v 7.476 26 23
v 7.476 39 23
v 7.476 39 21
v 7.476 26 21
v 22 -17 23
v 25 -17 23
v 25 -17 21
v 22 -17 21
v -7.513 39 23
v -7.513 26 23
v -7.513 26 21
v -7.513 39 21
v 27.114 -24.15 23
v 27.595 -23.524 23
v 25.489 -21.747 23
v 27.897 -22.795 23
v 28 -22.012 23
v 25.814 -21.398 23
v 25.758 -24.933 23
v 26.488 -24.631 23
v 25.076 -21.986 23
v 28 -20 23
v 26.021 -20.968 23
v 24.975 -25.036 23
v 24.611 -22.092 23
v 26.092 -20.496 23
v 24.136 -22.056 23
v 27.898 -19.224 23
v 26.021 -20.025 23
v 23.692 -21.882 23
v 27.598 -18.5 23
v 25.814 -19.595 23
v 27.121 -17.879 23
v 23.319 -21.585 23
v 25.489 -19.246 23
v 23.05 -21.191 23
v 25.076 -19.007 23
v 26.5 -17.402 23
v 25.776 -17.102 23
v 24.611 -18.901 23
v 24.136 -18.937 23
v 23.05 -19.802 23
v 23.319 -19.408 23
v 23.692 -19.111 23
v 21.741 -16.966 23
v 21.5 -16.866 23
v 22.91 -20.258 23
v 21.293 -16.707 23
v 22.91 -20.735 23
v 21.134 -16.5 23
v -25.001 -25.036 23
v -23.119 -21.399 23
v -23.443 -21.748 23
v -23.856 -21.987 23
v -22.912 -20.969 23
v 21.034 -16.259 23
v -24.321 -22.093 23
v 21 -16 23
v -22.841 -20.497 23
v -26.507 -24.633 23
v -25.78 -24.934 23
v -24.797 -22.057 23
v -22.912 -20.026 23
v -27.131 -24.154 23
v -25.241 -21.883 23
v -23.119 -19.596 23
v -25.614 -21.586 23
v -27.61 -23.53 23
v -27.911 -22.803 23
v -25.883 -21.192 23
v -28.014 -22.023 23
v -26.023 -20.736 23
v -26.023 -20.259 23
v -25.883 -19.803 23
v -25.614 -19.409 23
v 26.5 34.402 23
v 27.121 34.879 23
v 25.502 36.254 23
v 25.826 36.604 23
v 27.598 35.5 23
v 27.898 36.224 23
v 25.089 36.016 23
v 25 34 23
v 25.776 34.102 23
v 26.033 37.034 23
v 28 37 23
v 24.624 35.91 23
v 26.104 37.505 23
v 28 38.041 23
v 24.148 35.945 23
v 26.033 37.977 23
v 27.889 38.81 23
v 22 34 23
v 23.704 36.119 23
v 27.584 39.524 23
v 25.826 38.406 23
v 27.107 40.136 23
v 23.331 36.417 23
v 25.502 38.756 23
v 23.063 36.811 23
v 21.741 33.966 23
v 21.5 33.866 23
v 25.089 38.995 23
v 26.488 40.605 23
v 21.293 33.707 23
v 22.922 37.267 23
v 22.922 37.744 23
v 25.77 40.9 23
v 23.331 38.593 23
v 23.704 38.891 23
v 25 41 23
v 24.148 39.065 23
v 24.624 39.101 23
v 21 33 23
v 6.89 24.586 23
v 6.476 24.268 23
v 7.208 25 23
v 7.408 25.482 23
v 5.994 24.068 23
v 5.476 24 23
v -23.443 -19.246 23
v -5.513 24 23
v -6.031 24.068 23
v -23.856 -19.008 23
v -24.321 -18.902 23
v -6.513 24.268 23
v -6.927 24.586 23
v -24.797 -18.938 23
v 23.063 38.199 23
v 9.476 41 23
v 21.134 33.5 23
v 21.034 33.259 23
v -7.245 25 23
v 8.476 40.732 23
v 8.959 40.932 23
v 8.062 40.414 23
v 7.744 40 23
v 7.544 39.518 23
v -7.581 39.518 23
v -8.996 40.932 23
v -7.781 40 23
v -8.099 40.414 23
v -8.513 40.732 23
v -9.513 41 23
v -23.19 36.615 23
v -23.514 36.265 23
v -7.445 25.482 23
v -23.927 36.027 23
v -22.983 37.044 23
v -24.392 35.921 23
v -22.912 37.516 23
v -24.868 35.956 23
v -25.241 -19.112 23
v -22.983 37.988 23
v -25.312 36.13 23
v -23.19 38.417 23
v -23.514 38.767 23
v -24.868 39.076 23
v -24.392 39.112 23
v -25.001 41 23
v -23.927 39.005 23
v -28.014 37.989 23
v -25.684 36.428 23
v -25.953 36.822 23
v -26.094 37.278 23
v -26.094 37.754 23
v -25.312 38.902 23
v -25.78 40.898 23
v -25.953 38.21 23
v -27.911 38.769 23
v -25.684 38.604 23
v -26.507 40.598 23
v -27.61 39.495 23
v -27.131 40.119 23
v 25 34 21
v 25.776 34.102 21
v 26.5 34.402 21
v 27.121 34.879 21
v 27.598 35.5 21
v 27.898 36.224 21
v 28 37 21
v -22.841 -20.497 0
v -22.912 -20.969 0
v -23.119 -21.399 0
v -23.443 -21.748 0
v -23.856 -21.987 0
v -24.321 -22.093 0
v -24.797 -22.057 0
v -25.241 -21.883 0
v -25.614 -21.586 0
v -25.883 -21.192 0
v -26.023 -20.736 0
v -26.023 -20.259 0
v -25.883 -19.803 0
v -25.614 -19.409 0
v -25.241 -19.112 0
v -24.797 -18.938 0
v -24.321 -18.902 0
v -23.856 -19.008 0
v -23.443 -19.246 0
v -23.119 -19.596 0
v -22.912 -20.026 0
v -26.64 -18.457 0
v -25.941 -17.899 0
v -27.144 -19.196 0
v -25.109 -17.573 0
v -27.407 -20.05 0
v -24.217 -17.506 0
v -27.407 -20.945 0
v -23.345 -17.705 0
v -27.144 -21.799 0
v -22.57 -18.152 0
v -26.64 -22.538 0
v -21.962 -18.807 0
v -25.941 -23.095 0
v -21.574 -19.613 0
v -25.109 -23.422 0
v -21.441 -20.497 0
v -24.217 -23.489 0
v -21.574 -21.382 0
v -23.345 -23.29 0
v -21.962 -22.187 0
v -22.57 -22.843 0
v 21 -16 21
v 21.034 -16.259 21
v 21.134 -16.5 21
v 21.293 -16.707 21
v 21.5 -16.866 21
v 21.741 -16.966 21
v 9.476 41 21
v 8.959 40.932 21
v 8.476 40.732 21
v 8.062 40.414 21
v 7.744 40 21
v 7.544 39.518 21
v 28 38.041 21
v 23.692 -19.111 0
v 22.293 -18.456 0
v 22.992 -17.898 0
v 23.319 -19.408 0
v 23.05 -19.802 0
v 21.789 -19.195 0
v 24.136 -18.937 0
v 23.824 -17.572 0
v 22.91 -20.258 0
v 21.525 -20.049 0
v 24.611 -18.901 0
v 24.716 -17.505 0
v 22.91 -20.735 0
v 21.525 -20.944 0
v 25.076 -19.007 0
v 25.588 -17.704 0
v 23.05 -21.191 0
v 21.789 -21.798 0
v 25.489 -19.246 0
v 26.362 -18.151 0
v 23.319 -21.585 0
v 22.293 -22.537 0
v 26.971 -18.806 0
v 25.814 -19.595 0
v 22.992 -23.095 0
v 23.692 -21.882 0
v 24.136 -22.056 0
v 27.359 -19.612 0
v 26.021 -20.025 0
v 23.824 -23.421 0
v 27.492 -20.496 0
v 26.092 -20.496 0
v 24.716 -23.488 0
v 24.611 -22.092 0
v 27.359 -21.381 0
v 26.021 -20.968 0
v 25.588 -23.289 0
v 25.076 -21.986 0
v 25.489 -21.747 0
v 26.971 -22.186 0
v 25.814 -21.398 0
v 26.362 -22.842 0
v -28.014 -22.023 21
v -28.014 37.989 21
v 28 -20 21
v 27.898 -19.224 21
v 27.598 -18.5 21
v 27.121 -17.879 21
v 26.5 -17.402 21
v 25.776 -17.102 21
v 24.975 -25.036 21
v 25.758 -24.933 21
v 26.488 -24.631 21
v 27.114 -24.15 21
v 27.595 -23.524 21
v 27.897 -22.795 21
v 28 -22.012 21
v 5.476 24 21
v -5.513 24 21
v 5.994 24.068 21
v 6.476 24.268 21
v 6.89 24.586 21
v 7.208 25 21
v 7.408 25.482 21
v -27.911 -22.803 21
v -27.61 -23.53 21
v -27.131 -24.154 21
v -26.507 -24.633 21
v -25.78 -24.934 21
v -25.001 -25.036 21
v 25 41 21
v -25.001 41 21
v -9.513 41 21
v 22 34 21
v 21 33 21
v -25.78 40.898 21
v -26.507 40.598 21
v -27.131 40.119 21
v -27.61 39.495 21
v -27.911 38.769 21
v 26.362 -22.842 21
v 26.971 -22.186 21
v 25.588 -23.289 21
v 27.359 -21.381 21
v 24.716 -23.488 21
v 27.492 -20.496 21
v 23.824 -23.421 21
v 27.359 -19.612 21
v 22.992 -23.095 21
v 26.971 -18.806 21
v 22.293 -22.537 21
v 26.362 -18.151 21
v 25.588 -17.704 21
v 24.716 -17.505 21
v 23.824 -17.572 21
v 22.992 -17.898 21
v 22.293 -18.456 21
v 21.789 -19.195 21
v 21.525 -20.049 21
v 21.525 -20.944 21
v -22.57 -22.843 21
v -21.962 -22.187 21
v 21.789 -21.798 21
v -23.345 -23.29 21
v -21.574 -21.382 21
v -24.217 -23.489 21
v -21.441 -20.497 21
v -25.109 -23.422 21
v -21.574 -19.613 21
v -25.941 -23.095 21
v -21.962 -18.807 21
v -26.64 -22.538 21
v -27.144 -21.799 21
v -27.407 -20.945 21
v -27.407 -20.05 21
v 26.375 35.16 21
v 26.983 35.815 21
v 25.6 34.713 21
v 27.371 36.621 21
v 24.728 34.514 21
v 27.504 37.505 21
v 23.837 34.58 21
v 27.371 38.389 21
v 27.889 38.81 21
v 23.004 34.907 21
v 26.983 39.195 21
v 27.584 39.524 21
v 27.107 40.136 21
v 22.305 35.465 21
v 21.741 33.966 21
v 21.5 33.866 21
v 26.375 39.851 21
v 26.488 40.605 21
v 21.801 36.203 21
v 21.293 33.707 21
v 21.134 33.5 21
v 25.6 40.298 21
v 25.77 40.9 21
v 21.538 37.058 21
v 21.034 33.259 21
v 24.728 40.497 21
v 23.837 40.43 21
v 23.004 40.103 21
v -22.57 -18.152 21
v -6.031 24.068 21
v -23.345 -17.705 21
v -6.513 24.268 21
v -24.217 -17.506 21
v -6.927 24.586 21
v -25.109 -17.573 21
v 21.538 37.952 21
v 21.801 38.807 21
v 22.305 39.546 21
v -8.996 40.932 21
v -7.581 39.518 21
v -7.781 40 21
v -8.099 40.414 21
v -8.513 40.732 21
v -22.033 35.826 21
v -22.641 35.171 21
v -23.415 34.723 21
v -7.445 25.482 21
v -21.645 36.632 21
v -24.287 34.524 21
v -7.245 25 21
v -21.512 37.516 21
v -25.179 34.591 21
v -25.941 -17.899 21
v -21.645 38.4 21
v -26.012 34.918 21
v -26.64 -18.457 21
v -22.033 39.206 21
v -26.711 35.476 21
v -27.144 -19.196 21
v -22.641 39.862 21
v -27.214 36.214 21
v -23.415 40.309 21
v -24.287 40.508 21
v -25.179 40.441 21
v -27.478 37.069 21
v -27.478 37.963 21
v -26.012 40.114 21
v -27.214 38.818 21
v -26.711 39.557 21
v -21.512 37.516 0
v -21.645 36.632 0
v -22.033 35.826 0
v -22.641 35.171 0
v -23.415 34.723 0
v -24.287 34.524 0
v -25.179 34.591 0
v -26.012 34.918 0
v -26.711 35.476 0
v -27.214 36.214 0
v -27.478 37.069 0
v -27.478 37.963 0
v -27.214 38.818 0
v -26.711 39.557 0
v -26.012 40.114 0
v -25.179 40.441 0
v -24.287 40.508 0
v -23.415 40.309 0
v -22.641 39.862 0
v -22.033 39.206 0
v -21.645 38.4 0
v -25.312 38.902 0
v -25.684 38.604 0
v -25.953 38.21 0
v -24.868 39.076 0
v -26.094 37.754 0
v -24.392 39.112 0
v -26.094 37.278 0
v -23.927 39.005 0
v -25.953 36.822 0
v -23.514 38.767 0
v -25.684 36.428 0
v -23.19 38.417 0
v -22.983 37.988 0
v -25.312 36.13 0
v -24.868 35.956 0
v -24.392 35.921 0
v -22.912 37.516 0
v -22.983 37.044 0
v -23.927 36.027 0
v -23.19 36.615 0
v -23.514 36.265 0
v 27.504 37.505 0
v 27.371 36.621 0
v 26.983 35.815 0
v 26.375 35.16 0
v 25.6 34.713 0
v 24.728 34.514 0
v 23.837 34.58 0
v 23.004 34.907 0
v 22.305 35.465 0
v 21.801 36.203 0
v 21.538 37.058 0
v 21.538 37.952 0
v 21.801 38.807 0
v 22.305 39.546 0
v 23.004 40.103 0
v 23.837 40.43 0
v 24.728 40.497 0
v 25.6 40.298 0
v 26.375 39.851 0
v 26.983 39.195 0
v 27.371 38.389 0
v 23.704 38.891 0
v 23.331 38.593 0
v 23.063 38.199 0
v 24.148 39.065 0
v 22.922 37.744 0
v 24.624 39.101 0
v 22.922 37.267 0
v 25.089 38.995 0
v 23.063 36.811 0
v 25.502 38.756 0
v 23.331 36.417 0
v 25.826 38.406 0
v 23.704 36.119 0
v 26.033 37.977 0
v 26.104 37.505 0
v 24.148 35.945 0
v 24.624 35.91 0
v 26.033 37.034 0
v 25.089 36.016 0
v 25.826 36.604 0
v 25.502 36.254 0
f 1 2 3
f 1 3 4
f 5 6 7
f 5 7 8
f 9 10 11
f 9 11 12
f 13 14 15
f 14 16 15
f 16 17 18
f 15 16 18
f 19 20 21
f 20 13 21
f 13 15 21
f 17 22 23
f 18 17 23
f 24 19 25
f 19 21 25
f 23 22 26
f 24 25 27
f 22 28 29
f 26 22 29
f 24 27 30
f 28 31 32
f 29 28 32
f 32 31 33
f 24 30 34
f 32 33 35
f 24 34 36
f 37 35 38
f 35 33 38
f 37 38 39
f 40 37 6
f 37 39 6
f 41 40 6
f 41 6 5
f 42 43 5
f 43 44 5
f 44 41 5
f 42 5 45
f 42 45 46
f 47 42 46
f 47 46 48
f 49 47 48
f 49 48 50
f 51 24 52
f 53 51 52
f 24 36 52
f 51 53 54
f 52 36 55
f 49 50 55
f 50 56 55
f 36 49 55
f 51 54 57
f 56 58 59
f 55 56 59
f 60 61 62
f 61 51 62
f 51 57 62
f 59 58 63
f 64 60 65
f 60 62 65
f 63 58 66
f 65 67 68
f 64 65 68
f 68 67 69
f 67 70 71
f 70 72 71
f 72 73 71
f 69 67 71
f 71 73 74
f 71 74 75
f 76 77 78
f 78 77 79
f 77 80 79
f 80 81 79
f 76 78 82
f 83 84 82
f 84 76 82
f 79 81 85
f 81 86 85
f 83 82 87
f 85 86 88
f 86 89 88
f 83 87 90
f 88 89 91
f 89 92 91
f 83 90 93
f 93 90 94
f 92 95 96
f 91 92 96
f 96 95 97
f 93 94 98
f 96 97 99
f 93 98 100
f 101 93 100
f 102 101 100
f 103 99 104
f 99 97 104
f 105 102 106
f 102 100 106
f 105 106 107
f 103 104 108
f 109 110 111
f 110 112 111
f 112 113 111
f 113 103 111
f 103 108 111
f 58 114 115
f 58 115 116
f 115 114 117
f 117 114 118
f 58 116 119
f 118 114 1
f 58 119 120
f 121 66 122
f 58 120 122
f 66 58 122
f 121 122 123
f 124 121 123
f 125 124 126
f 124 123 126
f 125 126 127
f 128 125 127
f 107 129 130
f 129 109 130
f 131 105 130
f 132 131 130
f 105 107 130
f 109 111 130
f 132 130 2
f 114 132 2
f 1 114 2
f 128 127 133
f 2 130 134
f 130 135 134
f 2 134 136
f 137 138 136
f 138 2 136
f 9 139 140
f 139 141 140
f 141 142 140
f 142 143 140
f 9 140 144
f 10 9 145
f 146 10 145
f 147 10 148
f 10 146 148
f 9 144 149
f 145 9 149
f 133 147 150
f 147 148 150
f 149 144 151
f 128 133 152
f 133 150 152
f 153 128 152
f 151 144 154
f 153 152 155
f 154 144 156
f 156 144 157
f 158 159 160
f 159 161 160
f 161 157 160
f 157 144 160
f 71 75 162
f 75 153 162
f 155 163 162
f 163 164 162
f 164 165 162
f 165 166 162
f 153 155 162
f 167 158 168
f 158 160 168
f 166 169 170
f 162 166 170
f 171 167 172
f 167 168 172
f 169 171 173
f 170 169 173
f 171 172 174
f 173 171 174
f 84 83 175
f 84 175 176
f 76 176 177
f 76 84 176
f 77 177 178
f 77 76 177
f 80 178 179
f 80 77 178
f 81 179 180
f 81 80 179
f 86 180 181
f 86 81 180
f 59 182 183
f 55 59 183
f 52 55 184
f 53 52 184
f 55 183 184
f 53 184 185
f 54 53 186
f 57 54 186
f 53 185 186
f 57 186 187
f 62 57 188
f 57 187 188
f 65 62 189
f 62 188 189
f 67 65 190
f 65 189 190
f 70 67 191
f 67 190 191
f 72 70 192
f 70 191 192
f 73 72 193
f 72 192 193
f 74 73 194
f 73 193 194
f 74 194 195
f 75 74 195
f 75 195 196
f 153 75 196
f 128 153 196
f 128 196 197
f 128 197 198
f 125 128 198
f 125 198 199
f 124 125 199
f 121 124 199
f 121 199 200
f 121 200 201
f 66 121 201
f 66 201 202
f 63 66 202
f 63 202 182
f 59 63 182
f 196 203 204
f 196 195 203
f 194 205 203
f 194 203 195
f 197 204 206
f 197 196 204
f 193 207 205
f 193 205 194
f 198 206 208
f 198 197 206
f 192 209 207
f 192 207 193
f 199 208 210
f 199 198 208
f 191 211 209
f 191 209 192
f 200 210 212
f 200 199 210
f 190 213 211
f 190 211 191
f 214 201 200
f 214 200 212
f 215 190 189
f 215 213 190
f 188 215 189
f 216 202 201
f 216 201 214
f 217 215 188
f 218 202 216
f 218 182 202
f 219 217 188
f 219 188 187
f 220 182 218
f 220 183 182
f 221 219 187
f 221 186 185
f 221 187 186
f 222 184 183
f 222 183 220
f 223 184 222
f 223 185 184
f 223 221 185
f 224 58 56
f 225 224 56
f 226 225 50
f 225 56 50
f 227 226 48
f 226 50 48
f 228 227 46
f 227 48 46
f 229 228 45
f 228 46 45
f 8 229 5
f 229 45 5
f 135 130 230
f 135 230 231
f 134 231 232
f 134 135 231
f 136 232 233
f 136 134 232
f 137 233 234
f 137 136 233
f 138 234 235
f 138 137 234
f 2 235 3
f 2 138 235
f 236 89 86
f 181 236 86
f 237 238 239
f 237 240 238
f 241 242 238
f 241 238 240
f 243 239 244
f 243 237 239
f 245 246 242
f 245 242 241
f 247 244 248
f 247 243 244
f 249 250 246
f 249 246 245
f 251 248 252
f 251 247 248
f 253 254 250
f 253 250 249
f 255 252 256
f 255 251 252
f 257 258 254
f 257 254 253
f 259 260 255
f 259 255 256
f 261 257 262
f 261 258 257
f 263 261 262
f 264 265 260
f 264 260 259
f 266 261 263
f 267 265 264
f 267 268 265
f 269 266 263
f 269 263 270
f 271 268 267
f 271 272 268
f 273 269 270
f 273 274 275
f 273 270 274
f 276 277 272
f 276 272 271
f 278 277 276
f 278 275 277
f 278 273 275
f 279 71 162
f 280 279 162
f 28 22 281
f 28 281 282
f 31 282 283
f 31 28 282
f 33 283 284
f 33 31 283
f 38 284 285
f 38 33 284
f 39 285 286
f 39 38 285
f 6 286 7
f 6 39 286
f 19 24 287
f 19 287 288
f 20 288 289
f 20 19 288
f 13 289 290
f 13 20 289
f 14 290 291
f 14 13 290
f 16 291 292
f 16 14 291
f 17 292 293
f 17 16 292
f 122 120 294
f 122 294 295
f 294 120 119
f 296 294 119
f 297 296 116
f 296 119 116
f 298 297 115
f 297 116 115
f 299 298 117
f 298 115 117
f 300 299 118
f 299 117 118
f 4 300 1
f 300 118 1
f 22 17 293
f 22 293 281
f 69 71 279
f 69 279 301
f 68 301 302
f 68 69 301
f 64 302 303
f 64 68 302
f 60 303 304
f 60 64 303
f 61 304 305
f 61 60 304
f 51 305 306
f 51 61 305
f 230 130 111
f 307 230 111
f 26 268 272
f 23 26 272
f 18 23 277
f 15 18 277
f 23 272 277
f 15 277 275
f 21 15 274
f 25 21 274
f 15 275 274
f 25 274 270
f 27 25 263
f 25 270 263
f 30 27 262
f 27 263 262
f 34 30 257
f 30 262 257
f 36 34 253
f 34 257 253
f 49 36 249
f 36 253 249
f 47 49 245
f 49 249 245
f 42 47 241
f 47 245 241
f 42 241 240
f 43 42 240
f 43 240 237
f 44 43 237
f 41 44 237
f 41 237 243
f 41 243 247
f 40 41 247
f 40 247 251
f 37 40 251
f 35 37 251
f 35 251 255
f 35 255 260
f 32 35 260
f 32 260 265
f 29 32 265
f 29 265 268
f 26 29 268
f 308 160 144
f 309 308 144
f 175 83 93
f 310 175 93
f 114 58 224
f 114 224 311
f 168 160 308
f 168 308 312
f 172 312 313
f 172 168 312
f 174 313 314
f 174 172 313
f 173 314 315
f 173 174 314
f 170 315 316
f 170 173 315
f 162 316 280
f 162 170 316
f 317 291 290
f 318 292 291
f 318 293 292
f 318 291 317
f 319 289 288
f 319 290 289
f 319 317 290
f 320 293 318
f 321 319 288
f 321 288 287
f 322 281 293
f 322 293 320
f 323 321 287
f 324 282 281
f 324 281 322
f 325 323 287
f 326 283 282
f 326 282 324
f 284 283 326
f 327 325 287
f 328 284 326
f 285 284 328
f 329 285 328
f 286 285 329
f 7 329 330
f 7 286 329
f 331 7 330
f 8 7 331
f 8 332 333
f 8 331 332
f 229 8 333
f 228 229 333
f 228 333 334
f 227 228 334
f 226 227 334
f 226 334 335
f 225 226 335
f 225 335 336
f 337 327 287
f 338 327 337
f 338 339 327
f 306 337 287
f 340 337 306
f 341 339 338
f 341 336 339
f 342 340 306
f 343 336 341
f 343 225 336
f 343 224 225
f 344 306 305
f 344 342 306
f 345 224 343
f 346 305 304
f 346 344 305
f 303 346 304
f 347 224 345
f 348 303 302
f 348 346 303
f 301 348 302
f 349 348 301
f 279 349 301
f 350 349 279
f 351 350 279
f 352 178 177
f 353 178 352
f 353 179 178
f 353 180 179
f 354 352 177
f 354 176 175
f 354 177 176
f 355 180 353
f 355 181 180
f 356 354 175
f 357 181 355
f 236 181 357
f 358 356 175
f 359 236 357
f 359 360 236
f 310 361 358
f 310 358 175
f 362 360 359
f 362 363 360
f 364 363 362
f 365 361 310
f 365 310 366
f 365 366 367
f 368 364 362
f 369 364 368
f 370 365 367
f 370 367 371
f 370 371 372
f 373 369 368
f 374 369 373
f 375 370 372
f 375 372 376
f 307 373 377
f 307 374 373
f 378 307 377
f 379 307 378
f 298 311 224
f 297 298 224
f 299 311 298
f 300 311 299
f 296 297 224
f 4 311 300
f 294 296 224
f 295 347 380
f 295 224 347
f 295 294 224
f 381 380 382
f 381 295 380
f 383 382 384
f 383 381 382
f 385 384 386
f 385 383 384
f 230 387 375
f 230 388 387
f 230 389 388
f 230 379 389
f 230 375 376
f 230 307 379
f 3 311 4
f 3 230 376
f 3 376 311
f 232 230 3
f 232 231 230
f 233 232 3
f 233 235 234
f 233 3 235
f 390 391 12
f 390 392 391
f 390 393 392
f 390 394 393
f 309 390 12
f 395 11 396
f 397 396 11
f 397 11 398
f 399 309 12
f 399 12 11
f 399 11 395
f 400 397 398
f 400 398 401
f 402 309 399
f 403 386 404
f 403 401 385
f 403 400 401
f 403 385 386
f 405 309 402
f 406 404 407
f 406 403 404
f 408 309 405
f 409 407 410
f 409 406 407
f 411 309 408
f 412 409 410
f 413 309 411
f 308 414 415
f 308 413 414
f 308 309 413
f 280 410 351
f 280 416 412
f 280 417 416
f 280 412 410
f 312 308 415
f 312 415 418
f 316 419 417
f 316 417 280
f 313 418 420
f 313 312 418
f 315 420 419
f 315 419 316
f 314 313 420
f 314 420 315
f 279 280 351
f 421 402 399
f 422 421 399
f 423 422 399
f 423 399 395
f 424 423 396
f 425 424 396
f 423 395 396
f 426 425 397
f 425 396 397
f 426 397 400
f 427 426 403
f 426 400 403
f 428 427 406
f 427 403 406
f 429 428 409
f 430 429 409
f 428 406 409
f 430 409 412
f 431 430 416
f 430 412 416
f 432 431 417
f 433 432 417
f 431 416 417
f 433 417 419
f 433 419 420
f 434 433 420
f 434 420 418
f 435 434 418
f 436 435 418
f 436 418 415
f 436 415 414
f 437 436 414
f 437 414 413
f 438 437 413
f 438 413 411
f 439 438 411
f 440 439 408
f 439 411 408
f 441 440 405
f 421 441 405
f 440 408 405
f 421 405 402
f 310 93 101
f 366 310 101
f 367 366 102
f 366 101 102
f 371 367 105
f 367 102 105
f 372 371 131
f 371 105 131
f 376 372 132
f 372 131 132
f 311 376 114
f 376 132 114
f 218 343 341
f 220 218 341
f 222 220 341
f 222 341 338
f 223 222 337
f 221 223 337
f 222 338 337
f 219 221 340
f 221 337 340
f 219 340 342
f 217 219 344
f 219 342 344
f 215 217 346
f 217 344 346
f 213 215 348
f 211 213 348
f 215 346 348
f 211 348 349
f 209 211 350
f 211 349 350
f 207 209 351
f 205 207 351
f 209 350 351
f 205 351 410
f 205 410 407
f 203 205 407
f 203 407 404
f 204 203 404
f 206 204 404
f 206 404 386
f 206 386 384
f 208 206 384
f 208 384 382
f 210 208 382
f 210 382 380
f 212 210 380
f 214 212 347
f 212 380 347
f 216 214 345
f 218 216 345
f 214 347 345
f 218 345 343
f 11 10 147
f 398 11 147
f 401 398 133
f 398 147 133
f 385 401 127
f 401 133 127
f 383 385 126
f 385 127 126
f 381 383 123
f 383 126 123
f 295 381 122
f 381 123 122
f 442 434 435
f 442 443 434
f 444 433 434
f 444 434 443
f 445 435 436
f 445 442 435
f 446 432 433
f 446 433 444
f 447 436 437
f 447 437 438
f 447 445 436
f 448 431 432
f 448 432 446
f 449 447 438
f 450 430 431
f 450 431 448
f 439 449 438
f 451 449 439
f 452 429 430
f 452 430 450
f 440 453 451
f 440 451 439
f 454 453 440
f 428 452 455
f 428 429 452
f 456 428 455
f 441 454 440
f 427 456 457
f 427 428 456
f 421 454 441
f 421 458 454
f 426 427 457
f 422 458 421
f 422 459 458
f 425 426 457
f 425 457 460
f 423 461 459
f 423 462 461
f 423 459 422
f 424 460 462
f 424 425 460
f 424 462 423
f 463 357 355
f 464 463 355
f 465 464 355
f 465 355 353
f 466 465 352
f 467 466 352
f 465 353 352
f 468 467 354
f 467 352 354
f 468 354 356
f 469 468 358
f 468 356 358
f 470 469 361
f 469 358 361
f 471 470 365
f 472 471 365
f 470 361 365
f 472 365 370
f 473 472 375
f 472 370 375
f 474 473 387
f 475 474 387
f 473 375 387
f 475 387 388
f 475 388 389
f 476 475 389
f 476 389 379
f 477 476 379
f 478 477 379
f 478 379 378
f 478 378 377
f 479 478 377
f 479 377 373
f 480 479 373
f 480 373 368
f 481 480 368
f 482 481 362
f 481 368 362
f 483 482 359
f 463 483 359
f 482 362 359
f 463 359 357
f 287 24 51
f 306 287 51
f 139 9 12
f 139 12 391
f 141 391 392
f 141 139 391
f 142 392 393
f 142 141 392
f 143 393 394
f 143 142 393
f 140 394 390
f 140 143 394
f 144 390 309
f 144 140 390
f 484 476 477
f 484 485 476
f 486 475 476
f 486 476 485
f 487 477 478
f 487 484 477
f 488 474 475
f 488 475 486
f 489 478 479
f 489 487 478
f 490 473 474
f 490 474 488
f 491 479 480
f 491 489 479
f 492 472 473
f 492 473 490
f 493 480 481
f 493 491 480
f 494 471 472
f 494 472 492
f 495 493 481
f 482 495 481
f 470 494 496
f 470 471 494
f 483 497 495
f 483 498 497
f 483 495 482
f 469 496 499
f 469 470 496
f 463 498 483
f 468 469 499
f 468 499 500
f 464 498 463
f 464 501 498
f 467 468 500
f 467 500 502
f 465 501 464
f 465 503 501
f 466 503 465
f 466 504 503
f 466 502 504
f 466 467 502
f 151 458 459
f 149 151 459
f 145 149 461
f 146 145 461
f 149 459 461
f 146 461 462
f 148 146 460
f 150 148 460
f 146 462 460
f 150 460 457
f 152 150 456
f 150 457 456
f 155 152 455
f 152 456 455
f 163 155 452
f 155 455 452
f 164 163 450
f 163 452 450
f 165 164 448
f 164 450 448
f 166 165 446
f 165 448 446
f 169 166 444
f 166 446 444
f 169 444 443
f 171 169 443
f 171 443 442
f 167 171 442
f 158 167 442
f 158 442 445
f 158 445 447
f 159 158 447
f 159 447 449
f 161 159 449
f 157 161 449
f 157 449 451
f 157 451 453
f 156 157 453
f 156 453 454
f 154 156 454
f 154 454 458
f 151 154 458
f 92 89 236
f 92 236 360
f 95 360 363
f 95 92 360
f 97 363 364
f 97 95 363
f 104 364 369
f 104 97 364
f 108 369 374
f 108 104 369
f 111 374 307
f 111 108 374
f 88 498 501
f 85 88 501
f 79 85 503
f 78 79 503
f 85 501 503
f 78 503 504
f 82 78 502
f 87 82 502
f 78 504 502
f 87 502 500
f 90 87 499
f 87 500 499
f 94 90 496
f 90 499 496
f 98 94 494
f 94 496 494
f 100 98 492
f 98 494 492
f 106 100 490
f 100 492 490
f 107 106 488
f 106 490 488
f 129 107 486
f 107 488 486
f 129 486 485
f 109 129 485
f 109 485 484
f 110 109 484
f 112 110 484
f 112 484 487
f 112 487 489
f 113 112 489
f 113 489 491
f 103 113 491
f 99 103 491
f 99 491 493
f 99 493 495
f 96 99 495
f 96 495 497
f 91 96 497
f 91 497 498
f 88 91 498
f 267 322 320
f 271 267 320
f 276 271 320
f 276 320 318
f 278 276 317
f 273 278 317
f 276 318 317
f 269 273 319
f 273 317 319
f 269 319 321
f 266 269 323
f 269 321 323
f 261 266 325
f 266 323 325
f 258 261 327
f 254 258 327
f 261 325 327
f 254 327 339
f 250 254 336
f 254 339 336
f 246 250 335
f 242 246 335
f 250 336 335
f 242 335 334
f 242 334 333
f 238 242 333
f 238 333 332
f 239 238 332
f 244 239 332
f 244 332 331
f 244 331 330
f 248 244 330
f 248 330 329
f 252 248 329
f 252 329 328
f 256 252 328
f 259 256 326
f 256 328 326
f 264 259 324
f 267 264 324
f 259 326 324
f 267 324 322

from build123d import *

# Parameters (mm, degrees)
PAD008_DEPTH       = 2
SKETCH037_R        = 3
PAD009_DEPTH       = 21
SKETCH038_R        = 1.6
POCKET003005_DEPTH = 30


with BuildPart() as part:
    # Sketch035 → Pad008 (new body)
    with BuildSketch(Plane.XY):
        with BuildLine():
            Line((24.97547, -25.036306), (-25.000607, -25.036306))
            ThreePointArc((-28.013759, -22.023154), (-27.131227, -24.153774), (-25.000607, -25.036306))
            Line((-28.013759, -22.023154), (-28.013759, 37.989404))
            ThreePointArc((-25.000624, 41.000002), (-27.131078, 40.119115), (-28.013759, 37.989404))
            Line((-25.000624, 41.000002), (-9.513229, 41.000002))
            ThreePointArc((-7.513229, 39.000002), (-8.099015, 40.414215), (-9.513229, 41.000002))
            Line((-7.513229, 26), (-7.513229, 39.000002))
            ThreePointArc((-7.513229, 26), (-6.927443, 24.585787), (-5.513229, 24))
            Line((5.476271, 24), (-5.513229, 24))
            ThreePointArc((5.476271, 24), (6.890485, 24.585787), (7.476271, 26))
            Line((7.476271, 39.000016), (7.476271, 26))
            ThreePointArc((9.476271, 41.000016), (8.062057, 40.41423), (7.476271, 39.000016))
            Line((9.476271, 41.000016), (24.999953, 41.000016))
            ThreePointArc((28, 38.041338), (27.106731, 40.135916), (24.999953, 41.000016))
            Line((28, 38.041338), (28, 37))
            ThreePointArc((25, 34), (27.12132, 34.87868), (28, 37))
            Line((25, 34), (22, 34))
            ThreePointArc((22, 34), (21.292893, 33.707107), (21, 33))
            Line((21, -16), (21, 33))
            ThreePointArc((21, -16), (21.292893, -16.707107), (22, -17))
            Line((25, -17), (22, -17))
            ThreePointArc((27.999984, -19.999984), (27.121309, -17.878675), (25, -17))
            Line((27.999984, -22.011792), (27.999984, -19.999984))
            ThreePointArc((24.97547, -25.036306), (27.114124, -24.150446), (27.999984, -22.011792))
        make_face()
    extrude(amount=-PAD008_DEPTH)

    # Sketch037 → Pad009 (join)
    with BuildSketch(Plane(origin=(0, 0, -2), x_dir=(1, 0, 0), z_dir=(0, 0, -1))):
        with Locations((-24.440964, 20.497406)):
            Circle(SKETCH037_R)
        with Locations((24.491911, 20.496445)):
            Circle(SKETCH037_R)
        with Locations((-24.511511, -37.516029)):
            Circle(SKETCH037_R)
        with Locations((24.504074, -37.505135)):
            Circle(SKETCH037_R)
    extrude(amount=PAD009_DEPTH)

    # Sketch038 (on Face31 of Pad009) → Pocket003005 (cut)
    with BuildSketch(Plane(origin=(0, 0, -23), x_dir=(1, 0, 0), z_dir=(0, 0, -1))):
        with Locations((-24.440964, 20.497406)):
            Circle(SKETCH038_R)
        with Locations((24.491911, 20.496445)):
            Circle(SKETCH038_R)
        with Locations((-24.511511, -37.516029)):
            Circle(SKETCH038_R)
        with Locations((24.504074, -37.505135)):
            Circle(SKETCH038_R)
    extrude(amount=-POCKET003005_DEPTH, mode=Mode.SUBTRACT)


with BuildPart() as part_1:
    # Body007 placement: moved
    add(part.part.moved(Location((0, 0, 23))))


solid = part_1.part
